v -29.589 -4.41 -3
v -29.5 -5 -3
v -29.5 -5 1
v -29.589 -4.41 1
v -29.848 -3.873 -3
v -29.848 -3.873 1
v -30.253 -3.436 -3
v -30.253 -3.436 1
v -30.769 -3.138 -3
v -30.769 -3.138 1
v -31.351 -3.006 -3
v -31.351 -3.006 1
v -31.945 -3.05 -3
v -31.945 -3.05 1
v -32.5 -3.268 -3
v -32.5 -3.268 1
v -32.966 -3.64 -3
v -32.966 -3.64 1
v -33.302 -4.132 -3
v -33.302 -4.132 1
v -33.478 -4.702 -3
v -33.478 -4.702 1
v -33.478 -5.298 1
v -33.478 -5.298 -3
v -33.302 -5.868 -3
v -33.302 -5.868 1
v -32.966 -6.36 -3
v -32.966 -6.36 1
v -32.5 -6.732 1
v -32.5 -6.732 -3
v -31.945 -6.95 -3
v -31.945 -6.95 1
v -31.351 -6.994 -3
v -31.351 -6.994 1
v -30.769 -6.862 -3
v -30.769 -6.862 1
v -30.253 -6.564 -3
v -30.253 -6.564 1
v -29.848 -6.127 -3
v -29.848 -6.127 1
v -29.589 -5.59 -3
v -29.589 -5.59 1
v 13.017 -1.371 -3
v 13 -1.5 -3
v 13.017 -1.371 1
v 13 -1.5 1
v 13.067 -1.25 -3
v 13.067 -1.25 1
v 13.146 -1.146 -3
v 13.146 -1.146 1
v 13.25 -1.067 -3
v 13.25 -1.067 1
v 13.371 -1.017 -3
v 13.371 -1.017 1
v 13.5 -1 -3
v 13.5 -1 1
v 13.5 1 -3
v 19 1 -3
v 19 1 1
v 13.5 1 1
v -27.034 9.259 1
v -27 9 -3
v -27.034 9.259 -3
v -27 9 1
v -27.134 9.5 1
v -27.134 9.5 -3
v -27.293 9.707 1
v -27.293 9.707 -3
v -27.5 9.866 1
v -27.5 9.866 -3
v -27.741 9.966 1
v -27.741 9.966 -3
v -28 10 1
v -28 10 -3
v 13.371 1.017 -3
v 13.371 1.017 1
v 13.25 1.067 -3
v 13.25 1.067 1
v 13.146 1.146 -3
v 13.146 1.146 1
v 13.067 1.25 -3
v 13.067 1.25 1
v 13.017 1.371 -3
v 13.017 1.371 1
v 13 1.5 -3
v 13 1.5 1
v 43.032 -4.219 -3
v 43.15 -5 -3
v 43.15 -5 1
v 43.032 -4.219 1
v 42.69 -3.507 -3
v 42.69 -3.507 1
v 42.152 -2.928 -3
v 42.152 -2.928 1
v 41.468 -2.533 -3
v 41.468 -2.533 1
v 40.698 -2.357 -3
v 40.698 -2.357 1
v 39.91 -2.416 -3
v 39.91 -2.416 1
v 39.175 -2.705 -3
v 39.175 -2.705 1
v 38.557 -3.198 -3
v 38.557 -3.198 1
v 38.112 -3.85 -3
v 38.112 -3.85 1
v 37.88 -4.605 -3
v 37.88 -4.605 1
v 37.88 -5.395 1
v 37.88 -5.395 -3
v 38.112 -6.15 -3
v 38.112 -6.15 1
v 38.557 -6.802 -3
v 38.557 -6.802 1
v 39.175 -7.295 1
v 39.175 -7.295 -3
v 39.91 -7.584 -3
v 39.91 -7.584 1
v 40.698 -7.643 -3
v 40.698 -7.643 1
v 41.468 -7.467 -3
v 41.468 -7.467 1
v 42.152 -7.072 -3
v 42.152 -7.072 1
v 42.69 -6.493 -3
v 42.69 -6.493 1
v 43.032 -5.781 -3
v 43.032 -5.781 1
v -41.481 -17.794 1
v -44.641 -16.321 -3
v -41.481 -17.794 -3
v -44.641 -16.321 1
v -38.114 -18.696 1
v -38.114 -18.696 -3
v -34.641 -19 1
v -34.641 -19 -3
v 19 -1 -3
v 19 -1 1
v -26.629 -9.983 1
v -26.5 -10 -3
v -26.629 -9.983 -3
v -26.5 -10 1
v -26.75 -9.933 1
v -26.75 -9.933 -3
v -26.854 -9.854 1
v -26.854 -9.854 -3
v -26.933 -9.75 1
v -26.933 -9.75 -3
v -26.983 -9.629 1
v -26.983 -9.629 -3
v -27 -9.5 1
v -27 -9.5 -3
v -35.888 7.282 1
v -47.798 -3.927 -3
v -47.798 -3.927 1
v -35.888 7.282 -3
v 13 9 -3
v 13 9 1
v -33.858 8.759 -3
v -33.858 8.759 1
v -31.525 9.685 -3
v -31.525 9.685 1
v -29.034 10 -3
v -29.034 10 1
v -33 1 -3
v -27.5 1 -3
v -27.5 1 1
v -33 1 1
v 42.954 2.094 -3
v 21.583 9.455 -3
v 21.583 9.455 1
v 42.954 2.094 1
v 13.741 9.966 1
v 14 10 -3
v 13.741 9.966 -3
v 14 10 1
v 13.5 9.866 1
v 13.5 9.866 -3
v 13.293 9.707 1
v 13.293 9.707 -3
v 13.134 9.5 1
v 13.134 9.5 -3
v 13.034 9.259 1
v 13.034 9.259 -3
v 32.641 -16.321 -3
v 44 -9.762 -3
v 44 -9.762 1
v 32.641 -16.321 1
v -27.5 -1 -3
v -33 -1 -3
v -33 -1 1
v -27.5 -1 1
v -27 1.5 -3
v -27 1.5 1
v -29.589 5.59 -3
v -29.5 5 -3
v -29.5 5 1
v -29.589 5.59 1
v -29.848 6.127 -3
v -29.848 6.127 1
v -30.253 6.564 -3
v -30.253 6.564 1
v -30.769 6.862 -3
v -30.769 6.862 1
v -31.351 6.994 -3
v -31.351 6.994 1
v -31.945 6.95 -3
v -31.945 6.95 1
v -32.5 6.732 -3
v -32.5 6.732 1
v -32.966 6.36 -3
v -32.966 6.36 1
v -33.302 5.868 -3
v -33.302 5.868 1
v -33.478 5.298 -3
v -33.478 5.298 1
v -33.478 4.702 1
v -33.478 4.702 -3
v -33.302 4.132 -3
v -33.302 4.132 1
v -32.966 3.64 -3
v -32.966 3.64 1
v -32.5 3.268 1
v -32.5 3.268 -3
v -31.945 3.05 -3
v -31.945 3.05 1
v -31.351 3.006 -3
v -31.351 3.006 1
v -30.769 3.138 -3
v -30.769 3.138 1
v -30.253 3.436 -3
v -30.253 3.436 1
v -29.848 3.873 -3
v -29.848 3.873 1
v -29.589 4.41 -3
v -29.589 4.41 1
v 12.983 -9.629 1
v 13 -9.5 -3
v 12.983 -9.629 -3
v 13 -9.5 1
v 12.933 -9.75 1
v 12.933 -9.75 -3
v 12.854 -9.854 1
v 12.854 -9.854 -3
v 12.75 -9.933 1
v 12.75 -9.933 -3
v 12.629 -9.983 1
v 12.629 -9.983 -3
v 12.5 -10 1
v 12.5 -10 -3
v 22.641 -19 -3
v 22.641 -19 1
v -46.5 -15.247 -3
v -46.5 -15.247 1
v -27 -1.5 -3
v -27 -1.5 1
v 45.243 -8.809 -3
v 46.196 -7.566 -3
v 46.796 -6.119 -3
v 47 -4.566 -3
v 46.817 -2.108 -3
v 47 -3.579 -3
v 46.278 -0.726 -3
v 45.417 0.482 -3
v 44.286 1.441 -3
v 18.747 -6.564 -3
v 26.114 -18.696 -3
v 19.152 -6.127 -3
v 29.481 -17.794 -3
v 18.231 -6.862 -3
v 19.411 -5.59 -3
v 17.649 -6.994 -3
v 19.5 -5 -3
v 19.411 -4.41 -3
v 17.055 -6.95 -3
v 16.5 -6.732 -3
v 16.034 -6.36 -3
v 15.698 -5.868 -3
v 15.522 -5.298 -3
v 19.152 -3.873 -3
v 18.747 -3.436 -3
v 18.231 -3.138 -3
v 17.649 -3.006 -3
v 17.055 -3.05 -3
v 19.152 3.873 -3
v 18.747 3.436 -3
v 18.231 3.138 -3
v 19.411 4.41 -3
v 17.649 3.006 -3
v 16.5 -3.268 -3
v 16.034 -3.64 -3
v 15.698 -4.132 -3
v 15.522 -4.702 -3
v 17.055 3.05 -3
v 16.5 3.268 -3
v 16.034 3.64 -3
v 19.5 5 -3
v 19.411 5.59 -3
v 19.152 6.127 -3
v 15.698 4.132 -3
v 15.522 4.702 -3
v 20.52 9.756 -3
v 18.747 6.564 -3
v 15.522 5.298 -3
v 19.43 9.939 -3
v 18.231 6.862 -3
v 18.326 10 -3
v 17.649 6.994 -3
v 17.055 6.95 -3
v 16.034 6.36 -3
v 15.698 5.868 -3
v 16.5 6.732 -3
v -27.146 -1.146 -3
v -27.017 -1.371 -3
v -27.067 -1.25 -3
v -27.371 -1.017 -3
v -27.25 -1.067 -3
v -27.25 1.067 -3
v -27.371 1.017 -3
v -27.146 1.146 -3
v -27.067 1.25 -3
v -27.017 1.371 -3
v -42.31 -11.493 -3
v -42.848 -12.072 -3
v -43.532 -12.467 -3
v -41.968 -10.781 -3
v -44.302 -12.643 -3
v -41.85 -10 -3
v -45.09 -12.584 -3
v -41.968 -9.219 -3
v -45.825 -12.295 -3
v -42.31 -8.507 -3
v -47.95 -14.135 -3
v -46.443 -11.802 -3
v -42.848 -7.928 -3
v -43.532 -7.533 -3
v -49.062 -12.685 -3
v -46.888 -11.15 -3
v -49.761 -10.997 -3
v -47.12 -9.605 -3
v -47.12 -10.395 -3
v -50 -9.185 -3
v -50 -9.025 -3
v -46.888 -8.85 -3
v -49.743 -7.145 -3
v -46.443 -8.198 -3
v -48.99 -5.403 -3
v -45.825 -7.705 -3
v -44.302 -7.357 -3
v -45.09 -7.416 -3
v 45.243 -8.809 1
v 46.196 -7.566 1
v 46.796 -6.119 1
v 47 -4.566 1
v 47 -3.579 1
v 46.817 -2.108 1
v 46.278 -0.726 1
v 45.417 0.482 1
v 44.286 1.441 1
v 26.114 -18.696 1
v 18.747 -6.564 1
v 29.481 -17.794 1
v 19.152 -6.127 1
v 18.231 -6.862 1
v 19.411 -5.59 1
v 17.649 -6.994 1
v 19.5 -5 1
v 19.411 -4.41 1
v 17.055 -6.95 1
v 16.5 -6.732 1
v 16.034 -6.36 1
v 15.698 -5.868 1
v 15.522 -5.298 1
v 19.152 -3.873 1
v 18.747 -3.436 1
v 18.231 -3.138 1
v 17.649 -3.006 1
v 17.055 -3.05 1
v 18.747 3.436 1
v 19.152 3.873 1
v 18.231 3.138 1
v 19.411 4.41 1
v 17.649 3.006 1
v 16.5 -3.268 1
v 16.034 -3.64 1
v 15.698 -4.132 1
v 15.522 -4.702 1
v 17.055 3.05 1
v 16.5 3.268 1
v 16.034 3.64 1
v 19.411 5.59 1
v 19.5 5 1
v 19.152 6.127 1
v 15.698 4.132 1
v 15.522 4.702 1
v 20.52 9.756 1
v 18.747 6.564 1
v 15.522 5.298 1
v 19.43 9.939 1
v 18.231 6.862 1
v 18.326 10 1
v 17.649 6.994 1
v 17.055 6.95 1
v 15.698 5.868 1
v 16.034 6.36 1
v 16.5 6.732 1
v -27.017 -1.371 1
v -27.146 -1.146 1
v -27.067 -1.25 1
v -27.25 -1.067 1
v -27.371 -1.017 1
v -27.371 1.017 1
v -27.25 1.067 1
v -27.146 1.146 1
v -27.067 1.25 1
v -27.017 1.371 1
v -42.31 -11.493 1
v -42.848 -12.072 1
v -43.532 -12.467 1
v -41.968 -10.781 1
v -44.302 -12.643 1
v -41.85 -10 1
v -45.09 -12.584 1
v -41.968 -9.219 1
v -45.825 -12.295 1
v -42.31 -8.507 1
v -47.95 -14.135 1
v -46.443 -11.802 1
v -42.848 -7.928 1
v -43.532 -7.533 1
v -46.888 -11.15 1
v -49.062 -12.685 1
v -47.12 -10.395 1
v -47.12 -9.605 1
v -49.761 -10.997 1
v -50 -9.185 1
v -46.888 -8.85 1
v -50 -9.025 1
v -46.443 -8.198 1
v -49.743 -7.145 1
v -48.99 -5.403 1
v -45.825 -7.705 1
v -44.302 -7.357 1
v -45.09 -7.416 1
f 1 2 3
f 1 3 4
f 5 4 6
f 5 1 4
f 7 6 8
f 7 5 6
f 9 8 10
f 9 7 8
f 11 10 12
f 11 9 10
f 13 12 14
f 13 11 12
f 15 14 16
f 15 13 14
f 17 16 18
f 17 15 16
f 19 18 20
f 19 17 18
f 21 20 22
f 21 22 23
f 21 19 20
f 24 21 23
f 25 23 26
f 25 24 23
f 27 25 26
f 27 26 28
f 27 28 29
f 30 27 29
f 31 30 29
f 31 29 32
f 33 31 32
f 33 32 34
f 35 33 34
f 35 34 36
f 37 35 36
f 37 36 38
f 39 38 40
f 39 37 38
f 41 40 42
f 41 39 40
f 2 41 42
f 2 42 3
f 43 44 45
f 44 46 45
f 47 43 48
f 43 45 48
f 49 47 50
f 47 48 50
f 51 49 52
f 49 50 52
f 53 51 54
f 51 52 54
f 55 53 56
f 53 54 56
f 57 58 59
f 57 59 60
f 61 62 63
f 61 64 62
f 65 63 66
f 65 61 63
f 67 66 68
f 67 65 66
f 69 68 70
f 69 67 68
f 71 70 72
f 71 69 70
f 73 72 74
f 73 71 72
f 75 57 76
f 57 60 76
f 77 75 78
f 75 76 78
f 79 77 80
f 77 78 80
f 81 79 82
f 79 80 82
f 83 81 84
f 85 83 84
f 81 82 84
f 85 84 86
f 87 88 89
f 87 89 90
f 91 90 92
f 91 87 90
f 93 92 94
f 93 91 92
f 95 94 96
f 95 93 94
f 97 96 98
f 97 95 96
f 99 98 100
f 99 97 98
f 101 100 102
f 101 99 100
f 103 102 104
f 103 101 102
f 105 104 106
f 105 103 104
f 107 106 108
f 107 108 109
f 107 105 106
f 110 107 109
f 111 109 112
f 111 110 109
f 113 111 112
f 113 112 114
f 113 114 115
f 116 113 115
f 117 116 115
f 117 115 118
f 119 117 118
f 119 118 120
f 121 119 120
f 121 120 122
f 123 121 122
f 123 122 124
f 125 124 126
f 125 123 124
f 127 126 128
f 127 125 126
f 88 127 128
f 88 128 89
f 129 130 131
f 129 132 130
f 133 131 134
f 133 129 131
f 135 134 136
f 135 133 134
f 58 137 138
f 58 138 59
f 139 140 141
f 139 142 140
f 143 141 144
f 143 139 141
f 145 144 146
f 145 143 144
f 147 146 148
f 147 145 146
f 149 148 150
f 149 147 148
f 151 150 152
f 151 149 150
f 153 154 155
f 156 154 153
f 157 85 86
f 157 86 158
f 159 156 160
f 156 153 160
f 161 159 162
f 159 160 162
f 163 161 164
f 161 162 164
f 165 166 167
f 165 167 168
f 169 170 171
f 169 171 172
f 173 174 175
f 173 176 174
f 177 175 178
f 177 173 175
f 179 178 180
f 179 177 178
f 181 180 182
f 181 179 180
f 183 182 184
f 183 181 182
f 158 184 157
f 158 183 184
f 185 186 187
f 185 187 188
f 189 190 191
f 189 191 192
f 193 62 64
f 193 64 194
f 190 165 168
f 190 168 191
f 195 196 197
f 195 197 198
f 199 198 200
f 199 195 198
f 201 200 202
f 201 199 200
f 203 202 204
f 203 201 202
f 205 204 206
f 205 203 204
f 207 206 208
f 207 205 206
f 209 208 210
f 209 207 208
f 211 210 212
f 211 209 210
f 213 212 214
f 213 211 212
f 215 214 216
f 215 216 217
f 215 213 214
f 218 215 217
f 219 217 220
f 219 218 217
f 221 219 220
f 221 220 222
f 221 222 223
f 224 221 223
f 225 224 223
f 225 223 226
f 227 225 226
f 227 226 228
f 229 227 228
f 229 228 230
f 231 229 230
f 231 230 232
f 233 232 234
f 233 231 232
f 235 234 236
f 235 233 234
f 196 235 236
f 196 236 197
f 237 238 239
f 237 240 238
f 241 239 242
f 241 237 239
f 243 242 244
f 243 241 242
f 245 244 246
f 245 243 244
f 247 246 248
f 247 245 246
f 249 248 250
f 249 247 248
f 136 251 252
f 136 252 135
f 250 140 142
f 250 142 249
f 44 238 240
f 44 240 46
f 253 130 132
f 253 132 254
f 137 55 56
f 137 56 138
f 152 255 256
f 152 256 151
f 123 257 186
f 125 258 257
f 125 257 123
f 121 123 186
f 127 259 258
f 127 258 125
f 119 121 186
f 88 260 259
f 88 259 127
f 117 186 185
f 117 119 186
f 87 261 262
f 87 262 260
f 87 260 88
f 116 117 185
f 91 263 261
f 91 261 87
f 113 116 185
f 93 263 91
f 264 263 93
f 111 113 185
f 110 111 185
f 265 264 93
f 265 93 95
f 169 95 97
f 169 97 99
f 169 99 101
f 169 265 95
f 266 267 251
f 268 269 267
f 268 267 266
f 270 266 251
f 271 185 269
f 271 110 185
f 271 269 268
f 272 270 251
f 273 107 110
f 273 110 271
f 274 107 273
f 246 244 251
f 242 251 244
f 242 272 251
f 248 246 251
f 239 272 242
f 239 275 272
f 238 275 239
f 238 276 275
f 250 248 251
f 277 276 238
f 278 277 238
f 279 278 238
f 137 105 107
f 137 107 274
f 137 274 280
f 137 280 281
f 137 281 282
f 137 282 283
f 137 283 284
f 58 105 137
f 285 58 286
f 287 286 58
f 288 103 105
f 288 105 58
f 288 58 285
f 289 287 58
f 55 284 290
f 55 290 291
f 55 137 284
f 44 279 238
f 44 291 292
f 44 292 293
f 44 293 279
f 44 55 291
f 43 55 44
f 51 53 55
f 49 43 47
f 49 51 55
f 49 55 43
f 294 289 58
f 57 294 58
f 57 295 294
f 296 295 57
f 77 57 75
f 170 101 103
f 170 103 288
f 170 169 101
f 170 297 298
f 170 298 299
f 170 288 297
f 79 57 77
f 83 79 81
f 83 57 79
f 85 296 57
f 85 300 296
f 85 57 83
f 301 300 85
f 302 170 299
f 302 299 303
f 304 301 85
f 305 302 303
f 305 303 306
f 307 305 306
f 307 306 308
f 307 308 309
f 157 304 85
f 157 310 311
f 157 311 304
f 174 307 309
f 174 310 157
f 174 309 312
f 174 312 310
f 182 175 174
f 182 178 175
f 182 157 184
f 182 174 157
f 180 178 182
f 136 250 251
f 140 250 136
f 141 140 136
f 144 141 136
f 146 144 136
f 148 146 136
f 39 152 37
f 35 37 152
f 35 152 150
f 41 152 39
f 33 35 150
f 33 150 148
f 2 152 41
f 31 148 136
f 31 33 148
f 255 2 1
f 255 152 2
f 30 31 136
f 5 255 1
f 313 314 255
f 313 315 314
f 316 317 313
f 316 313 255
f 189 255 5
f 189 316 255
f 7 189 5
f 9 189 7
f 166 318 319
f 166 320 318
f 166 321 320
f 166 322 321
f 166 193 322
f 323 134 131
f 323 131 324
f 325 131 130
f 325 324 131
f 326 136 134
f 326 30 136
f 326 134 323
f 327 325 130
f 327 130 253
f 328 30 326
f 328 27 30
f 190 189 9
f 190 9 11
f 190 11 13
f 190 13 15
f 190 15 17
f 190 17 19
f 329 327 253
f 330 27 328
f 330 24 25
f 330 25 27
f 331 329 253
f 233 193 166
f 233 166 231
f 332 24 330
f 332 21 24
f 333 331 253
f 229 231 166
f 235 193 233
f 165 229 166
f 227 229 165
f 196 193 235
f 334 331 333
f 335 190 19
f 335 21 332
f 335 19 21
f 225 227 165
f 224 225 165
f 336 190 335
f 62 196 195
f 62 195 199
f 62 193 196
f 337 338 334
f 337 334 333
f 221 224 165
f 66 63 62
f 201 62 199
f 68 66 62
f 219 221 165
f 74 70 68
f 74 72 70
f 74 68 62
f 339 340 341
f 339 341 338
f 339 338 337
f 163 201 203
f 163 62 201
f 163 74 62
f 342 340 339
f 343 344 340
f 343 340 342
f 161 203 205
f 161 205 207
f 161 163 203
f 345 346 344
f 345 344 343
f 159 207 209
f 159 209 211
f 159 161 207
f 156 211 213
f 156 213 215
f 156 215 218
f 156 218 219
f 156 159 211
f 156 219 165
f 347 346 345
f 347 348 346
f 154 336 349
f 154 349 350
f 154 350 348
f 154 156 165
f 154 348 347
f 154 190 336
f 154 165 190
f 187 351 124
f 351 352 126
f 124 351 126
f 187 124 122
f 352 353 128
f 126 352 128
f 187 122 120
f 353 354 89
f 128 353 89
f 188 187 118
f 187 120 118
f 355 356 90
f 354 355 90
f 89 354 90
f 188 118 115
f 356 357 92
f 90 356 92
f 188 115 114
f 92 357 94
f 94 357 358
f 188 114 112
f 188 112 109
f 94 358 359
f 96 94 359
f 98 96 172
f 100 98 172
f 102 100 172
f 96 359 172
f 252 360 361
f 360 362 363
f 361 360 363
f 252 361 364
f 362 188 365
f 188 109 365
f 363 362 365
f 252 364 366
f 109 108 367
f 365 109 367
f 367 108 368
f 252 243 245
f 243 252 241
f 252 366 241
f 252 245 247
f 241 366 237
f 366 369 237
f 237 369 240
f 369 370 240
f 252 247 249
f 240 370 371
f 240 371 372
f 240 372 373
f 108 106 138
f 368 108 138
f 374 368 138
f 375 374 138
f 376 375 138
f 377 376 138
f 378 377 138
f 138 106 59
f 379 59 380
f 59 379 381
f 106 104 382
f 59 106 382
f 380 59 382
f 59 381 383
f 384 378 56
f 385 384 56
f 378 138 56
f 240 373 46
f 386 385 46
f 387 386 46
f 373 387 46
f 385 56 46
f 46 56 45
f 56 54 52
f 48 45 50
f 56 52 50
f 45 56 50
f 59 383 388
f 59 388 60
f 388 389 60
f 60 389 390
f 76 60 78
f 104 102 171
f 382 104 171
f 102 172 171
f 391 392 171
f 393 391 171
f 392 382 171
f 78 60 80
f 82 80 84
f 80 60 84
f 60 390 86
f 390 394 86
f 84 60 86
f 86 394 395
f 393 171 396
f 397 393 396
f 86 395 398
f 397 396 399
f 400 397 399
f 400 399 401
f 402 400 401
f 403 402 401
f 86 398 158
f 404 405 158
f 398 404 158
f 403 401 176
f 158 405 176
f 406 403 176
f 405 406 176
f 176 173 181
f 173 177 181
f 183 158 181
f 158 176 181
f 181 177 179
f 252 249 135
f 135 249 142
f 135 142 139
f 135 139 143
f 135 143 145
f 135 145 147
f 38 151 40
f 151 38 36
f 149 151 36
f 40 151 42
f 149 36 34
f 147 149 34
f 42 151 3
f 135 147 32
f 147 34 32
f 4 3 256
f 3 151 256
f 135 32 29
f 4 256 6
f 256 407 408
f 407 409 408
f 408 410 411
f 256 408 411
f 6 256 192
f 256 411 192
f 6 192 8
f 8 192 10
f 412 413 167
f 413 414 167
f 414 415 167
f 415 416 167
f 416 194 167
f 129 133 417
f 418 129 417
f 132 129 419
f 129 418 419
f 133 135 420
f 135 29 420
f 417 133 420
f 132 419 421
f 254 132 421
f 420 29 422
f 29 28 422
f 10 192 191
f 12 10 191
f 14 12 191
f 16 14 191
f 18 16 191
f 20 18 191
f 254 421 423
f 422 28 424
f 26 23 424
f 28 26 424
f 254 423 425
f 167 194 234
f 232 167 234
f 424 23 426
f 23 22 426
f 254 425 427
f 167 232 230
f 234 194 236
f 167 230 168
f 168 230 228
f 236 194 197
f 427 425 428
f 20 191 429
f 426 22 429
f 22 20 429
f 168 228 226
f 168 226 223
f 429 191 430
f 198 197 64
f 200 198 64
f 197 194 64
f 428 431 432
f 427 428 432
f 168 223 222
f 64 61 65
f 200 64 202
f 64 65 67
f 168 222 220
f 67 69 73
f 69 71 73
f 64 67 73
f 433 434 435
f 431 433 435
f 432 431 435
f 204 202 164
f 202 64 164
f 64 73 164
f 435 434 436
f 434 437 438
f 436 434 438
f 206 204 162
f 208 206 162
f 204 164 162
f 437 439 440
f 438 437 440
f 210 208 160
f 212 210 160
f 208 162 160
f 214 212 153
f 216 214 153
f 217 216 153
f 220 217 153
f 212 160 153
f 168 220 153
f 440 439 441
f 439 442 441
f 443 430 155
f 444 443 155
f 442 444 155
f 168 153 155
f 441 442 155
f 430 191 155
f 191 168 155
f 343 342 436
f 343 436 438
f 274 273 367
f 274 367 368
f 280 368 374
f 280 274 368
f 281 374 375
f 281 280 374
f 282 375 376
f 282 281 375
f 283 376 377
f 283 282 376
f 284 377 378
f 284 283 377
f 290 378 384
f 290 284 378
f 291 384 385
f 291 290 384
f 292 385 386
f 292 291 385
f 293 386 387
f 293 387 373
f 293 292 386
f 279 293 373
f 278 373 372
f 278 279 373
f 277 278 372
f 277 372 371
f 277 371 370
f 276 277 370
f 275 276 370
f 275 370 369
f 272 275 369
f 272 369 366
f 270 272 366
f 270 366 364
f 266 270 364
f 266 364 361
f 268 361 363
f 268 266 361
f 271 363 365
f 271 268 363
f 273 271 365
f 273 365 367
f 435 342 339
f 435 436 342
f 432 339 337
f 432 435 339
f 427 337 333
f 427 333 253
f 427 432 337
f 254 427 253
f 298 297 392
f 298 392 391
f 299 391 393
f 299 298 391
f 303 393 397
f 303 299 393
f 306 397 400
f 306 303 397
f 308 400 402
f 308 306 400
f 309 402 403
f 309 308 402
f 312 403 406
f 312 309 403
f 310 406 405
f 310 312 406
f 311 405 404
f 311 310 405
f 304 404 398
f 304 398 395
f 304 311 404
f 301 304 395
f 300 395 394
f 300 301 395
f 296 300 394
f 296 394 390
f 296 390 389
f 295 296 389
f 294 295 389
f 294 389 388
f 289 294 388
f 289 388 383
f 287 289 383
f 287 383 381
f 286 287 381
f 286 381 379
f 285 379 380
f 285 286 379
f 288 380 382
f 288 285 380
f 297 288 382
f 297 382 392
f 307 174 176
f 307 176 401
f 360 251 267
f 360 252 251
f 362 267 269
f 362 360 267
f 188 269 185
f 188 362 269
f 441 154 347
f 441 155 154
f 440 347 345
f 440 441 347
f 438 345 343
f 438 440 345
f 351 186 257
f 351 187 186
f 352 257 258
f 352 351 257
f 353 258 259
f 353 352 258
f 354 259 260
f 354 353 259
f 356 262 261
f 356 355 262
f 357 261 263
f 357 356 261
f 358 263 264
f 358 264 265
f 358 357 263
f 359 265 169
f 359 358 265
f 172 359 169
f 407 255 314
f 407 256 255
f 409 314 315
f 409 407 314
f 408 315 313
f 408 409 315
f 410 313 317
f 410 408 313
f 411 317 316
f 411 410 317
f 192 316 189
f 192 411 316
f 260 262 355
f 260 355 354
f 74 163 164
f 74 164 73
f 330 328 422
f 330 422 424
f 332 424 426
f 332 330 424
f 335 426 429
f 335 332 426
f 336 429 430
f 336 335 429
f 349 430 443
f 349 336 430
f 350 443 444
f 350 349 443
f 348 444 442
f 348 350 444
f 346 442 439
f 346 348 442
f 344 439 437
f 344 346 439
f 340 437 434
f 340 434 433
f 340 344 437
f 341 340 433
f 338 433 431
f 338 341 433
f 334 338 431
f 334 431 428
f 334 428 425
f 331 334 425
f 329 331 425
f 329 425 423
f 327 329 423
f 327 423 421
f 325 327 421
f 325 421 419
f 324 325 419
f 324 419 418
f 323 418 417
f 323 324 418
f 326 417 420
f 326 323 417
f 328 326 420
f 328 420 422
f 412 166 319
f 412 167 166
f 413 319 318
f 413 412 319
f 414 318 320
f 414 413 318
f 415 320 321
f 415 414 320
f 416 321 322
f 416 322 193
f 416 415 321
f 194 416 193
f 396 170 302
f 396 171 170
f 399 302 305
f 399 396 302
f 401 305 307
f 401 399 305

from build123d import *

# Parameters (mm, degrees)
SKETCH005_R   = 2
SKETCH005_R_2 = 2.65
PAD_DEPTH     = 4
FILLET_R      = 7
FILLET001_R   = 20
FILLET002_R   = 6
FILLET003_R   = 10
FILLET004_R   = 1
FILLET005_R   = 0.5
FILLET006_R   = 0.5


with BuildPart() as part:
    # Sketch005 → Pad (new body)
    with BuildSketch(Plane.XY.offset(-3)):
        Polygon((-33, 10), (-27, 10), (-27, 1), (-33, 1), (-33, -1), (-27, -1), (-27, -10), (13, -10), (13, -1), (19, -1), (19, 1), (13, 1), (13, 10), (20, 10), (47, 0.7), (47, -8.030345), (28, -19), (-40, -19), (-50, -13.226497), (-50, -6), align=None)
        with Locations((-31.5, 5)):
            Circle(SKETCH005_R, mode=Mode.SUBTRACT)
        with Locations((-31.5, -5)):
            Circle(SKETCH005_R, mode=Mode.SUBTRACT)
        with Locations((17.5, 5)):
            Circle(SKETCH005_R, mode=Mode.SUBTRACT)
        with Locations((17.5, -5)):
            Circle(SKETCH005_R, mode=Mode.SUBTRACT)
        with Locations((40.5, -5)):
            Circle(SKETCH005_R_2, mode=Mode.SUBTRACT)
        with Locations((-44.5, -10)):
            Circle(SKETCH005_R_2, mode=Mode.SUBTRACT)
    extrude(amount=PAD_DEPTH)

    # Fillet
    fillet_edges = [part.edges().sort_by_distance(p)[0] for p in [
        (-50, -13.226497, -1),
        (-50, -6, -1),
    ]]
    fillet(fillet_edges, radius=FILLET_R)

    # Fillet001
    fillet001_edges = [part.edges().sort_by_distance(p)[0] for p in [
        (-40, -19, -1),
        (28, -19, -1),
    ]]
    fillet(fillet001_edges, radius=FILLET001_R)

    # Fillet002
    fillet002_edges = [part.edges().sort_by_distance(p)[0] for p in [
        (47, -8.030345, -1),
        (47, 0.7, -1),
    ]]
    fillet(fillet002_edges, radius=FILLET002_R)

    # Fillet003
    fillet003_edges = [part.edges().sort_by_distance(p)[0] for p in [
        (-33, 10, -1),
        (20, 10, -1),
    ]]
    fillet(fillet003_edges, radius=FILLET003_R)

    # Fillet004
    fillet004_edges = [part.edges().sort_by_distance(p)[0] for p in [
        (13, 10, -1),
        (-27, 10, -1),
    ]]
    fillet(fillet004_edges, radius=FILLET004_R)

    # Fillet005
    fillet005_edges = [part.edges().sort_by_distance(p)[0] for p in [
        (13, -10, -1),
        (-27, -10, -1),
    ]]
    fillet(fillet005_edges, radius=FILLET005_R)

    # Fillet006
    fillet006_edges = [part.edges().sort_by_distance(p)[0] for p in [
        (-27, -1, -1),
        (-27, 1, -1),
        (13, -1, -1),
        (13, 1, -1),
    ]]
    fillet(fillet006_edges, radius=FILLET006_R)


solid = part.part
